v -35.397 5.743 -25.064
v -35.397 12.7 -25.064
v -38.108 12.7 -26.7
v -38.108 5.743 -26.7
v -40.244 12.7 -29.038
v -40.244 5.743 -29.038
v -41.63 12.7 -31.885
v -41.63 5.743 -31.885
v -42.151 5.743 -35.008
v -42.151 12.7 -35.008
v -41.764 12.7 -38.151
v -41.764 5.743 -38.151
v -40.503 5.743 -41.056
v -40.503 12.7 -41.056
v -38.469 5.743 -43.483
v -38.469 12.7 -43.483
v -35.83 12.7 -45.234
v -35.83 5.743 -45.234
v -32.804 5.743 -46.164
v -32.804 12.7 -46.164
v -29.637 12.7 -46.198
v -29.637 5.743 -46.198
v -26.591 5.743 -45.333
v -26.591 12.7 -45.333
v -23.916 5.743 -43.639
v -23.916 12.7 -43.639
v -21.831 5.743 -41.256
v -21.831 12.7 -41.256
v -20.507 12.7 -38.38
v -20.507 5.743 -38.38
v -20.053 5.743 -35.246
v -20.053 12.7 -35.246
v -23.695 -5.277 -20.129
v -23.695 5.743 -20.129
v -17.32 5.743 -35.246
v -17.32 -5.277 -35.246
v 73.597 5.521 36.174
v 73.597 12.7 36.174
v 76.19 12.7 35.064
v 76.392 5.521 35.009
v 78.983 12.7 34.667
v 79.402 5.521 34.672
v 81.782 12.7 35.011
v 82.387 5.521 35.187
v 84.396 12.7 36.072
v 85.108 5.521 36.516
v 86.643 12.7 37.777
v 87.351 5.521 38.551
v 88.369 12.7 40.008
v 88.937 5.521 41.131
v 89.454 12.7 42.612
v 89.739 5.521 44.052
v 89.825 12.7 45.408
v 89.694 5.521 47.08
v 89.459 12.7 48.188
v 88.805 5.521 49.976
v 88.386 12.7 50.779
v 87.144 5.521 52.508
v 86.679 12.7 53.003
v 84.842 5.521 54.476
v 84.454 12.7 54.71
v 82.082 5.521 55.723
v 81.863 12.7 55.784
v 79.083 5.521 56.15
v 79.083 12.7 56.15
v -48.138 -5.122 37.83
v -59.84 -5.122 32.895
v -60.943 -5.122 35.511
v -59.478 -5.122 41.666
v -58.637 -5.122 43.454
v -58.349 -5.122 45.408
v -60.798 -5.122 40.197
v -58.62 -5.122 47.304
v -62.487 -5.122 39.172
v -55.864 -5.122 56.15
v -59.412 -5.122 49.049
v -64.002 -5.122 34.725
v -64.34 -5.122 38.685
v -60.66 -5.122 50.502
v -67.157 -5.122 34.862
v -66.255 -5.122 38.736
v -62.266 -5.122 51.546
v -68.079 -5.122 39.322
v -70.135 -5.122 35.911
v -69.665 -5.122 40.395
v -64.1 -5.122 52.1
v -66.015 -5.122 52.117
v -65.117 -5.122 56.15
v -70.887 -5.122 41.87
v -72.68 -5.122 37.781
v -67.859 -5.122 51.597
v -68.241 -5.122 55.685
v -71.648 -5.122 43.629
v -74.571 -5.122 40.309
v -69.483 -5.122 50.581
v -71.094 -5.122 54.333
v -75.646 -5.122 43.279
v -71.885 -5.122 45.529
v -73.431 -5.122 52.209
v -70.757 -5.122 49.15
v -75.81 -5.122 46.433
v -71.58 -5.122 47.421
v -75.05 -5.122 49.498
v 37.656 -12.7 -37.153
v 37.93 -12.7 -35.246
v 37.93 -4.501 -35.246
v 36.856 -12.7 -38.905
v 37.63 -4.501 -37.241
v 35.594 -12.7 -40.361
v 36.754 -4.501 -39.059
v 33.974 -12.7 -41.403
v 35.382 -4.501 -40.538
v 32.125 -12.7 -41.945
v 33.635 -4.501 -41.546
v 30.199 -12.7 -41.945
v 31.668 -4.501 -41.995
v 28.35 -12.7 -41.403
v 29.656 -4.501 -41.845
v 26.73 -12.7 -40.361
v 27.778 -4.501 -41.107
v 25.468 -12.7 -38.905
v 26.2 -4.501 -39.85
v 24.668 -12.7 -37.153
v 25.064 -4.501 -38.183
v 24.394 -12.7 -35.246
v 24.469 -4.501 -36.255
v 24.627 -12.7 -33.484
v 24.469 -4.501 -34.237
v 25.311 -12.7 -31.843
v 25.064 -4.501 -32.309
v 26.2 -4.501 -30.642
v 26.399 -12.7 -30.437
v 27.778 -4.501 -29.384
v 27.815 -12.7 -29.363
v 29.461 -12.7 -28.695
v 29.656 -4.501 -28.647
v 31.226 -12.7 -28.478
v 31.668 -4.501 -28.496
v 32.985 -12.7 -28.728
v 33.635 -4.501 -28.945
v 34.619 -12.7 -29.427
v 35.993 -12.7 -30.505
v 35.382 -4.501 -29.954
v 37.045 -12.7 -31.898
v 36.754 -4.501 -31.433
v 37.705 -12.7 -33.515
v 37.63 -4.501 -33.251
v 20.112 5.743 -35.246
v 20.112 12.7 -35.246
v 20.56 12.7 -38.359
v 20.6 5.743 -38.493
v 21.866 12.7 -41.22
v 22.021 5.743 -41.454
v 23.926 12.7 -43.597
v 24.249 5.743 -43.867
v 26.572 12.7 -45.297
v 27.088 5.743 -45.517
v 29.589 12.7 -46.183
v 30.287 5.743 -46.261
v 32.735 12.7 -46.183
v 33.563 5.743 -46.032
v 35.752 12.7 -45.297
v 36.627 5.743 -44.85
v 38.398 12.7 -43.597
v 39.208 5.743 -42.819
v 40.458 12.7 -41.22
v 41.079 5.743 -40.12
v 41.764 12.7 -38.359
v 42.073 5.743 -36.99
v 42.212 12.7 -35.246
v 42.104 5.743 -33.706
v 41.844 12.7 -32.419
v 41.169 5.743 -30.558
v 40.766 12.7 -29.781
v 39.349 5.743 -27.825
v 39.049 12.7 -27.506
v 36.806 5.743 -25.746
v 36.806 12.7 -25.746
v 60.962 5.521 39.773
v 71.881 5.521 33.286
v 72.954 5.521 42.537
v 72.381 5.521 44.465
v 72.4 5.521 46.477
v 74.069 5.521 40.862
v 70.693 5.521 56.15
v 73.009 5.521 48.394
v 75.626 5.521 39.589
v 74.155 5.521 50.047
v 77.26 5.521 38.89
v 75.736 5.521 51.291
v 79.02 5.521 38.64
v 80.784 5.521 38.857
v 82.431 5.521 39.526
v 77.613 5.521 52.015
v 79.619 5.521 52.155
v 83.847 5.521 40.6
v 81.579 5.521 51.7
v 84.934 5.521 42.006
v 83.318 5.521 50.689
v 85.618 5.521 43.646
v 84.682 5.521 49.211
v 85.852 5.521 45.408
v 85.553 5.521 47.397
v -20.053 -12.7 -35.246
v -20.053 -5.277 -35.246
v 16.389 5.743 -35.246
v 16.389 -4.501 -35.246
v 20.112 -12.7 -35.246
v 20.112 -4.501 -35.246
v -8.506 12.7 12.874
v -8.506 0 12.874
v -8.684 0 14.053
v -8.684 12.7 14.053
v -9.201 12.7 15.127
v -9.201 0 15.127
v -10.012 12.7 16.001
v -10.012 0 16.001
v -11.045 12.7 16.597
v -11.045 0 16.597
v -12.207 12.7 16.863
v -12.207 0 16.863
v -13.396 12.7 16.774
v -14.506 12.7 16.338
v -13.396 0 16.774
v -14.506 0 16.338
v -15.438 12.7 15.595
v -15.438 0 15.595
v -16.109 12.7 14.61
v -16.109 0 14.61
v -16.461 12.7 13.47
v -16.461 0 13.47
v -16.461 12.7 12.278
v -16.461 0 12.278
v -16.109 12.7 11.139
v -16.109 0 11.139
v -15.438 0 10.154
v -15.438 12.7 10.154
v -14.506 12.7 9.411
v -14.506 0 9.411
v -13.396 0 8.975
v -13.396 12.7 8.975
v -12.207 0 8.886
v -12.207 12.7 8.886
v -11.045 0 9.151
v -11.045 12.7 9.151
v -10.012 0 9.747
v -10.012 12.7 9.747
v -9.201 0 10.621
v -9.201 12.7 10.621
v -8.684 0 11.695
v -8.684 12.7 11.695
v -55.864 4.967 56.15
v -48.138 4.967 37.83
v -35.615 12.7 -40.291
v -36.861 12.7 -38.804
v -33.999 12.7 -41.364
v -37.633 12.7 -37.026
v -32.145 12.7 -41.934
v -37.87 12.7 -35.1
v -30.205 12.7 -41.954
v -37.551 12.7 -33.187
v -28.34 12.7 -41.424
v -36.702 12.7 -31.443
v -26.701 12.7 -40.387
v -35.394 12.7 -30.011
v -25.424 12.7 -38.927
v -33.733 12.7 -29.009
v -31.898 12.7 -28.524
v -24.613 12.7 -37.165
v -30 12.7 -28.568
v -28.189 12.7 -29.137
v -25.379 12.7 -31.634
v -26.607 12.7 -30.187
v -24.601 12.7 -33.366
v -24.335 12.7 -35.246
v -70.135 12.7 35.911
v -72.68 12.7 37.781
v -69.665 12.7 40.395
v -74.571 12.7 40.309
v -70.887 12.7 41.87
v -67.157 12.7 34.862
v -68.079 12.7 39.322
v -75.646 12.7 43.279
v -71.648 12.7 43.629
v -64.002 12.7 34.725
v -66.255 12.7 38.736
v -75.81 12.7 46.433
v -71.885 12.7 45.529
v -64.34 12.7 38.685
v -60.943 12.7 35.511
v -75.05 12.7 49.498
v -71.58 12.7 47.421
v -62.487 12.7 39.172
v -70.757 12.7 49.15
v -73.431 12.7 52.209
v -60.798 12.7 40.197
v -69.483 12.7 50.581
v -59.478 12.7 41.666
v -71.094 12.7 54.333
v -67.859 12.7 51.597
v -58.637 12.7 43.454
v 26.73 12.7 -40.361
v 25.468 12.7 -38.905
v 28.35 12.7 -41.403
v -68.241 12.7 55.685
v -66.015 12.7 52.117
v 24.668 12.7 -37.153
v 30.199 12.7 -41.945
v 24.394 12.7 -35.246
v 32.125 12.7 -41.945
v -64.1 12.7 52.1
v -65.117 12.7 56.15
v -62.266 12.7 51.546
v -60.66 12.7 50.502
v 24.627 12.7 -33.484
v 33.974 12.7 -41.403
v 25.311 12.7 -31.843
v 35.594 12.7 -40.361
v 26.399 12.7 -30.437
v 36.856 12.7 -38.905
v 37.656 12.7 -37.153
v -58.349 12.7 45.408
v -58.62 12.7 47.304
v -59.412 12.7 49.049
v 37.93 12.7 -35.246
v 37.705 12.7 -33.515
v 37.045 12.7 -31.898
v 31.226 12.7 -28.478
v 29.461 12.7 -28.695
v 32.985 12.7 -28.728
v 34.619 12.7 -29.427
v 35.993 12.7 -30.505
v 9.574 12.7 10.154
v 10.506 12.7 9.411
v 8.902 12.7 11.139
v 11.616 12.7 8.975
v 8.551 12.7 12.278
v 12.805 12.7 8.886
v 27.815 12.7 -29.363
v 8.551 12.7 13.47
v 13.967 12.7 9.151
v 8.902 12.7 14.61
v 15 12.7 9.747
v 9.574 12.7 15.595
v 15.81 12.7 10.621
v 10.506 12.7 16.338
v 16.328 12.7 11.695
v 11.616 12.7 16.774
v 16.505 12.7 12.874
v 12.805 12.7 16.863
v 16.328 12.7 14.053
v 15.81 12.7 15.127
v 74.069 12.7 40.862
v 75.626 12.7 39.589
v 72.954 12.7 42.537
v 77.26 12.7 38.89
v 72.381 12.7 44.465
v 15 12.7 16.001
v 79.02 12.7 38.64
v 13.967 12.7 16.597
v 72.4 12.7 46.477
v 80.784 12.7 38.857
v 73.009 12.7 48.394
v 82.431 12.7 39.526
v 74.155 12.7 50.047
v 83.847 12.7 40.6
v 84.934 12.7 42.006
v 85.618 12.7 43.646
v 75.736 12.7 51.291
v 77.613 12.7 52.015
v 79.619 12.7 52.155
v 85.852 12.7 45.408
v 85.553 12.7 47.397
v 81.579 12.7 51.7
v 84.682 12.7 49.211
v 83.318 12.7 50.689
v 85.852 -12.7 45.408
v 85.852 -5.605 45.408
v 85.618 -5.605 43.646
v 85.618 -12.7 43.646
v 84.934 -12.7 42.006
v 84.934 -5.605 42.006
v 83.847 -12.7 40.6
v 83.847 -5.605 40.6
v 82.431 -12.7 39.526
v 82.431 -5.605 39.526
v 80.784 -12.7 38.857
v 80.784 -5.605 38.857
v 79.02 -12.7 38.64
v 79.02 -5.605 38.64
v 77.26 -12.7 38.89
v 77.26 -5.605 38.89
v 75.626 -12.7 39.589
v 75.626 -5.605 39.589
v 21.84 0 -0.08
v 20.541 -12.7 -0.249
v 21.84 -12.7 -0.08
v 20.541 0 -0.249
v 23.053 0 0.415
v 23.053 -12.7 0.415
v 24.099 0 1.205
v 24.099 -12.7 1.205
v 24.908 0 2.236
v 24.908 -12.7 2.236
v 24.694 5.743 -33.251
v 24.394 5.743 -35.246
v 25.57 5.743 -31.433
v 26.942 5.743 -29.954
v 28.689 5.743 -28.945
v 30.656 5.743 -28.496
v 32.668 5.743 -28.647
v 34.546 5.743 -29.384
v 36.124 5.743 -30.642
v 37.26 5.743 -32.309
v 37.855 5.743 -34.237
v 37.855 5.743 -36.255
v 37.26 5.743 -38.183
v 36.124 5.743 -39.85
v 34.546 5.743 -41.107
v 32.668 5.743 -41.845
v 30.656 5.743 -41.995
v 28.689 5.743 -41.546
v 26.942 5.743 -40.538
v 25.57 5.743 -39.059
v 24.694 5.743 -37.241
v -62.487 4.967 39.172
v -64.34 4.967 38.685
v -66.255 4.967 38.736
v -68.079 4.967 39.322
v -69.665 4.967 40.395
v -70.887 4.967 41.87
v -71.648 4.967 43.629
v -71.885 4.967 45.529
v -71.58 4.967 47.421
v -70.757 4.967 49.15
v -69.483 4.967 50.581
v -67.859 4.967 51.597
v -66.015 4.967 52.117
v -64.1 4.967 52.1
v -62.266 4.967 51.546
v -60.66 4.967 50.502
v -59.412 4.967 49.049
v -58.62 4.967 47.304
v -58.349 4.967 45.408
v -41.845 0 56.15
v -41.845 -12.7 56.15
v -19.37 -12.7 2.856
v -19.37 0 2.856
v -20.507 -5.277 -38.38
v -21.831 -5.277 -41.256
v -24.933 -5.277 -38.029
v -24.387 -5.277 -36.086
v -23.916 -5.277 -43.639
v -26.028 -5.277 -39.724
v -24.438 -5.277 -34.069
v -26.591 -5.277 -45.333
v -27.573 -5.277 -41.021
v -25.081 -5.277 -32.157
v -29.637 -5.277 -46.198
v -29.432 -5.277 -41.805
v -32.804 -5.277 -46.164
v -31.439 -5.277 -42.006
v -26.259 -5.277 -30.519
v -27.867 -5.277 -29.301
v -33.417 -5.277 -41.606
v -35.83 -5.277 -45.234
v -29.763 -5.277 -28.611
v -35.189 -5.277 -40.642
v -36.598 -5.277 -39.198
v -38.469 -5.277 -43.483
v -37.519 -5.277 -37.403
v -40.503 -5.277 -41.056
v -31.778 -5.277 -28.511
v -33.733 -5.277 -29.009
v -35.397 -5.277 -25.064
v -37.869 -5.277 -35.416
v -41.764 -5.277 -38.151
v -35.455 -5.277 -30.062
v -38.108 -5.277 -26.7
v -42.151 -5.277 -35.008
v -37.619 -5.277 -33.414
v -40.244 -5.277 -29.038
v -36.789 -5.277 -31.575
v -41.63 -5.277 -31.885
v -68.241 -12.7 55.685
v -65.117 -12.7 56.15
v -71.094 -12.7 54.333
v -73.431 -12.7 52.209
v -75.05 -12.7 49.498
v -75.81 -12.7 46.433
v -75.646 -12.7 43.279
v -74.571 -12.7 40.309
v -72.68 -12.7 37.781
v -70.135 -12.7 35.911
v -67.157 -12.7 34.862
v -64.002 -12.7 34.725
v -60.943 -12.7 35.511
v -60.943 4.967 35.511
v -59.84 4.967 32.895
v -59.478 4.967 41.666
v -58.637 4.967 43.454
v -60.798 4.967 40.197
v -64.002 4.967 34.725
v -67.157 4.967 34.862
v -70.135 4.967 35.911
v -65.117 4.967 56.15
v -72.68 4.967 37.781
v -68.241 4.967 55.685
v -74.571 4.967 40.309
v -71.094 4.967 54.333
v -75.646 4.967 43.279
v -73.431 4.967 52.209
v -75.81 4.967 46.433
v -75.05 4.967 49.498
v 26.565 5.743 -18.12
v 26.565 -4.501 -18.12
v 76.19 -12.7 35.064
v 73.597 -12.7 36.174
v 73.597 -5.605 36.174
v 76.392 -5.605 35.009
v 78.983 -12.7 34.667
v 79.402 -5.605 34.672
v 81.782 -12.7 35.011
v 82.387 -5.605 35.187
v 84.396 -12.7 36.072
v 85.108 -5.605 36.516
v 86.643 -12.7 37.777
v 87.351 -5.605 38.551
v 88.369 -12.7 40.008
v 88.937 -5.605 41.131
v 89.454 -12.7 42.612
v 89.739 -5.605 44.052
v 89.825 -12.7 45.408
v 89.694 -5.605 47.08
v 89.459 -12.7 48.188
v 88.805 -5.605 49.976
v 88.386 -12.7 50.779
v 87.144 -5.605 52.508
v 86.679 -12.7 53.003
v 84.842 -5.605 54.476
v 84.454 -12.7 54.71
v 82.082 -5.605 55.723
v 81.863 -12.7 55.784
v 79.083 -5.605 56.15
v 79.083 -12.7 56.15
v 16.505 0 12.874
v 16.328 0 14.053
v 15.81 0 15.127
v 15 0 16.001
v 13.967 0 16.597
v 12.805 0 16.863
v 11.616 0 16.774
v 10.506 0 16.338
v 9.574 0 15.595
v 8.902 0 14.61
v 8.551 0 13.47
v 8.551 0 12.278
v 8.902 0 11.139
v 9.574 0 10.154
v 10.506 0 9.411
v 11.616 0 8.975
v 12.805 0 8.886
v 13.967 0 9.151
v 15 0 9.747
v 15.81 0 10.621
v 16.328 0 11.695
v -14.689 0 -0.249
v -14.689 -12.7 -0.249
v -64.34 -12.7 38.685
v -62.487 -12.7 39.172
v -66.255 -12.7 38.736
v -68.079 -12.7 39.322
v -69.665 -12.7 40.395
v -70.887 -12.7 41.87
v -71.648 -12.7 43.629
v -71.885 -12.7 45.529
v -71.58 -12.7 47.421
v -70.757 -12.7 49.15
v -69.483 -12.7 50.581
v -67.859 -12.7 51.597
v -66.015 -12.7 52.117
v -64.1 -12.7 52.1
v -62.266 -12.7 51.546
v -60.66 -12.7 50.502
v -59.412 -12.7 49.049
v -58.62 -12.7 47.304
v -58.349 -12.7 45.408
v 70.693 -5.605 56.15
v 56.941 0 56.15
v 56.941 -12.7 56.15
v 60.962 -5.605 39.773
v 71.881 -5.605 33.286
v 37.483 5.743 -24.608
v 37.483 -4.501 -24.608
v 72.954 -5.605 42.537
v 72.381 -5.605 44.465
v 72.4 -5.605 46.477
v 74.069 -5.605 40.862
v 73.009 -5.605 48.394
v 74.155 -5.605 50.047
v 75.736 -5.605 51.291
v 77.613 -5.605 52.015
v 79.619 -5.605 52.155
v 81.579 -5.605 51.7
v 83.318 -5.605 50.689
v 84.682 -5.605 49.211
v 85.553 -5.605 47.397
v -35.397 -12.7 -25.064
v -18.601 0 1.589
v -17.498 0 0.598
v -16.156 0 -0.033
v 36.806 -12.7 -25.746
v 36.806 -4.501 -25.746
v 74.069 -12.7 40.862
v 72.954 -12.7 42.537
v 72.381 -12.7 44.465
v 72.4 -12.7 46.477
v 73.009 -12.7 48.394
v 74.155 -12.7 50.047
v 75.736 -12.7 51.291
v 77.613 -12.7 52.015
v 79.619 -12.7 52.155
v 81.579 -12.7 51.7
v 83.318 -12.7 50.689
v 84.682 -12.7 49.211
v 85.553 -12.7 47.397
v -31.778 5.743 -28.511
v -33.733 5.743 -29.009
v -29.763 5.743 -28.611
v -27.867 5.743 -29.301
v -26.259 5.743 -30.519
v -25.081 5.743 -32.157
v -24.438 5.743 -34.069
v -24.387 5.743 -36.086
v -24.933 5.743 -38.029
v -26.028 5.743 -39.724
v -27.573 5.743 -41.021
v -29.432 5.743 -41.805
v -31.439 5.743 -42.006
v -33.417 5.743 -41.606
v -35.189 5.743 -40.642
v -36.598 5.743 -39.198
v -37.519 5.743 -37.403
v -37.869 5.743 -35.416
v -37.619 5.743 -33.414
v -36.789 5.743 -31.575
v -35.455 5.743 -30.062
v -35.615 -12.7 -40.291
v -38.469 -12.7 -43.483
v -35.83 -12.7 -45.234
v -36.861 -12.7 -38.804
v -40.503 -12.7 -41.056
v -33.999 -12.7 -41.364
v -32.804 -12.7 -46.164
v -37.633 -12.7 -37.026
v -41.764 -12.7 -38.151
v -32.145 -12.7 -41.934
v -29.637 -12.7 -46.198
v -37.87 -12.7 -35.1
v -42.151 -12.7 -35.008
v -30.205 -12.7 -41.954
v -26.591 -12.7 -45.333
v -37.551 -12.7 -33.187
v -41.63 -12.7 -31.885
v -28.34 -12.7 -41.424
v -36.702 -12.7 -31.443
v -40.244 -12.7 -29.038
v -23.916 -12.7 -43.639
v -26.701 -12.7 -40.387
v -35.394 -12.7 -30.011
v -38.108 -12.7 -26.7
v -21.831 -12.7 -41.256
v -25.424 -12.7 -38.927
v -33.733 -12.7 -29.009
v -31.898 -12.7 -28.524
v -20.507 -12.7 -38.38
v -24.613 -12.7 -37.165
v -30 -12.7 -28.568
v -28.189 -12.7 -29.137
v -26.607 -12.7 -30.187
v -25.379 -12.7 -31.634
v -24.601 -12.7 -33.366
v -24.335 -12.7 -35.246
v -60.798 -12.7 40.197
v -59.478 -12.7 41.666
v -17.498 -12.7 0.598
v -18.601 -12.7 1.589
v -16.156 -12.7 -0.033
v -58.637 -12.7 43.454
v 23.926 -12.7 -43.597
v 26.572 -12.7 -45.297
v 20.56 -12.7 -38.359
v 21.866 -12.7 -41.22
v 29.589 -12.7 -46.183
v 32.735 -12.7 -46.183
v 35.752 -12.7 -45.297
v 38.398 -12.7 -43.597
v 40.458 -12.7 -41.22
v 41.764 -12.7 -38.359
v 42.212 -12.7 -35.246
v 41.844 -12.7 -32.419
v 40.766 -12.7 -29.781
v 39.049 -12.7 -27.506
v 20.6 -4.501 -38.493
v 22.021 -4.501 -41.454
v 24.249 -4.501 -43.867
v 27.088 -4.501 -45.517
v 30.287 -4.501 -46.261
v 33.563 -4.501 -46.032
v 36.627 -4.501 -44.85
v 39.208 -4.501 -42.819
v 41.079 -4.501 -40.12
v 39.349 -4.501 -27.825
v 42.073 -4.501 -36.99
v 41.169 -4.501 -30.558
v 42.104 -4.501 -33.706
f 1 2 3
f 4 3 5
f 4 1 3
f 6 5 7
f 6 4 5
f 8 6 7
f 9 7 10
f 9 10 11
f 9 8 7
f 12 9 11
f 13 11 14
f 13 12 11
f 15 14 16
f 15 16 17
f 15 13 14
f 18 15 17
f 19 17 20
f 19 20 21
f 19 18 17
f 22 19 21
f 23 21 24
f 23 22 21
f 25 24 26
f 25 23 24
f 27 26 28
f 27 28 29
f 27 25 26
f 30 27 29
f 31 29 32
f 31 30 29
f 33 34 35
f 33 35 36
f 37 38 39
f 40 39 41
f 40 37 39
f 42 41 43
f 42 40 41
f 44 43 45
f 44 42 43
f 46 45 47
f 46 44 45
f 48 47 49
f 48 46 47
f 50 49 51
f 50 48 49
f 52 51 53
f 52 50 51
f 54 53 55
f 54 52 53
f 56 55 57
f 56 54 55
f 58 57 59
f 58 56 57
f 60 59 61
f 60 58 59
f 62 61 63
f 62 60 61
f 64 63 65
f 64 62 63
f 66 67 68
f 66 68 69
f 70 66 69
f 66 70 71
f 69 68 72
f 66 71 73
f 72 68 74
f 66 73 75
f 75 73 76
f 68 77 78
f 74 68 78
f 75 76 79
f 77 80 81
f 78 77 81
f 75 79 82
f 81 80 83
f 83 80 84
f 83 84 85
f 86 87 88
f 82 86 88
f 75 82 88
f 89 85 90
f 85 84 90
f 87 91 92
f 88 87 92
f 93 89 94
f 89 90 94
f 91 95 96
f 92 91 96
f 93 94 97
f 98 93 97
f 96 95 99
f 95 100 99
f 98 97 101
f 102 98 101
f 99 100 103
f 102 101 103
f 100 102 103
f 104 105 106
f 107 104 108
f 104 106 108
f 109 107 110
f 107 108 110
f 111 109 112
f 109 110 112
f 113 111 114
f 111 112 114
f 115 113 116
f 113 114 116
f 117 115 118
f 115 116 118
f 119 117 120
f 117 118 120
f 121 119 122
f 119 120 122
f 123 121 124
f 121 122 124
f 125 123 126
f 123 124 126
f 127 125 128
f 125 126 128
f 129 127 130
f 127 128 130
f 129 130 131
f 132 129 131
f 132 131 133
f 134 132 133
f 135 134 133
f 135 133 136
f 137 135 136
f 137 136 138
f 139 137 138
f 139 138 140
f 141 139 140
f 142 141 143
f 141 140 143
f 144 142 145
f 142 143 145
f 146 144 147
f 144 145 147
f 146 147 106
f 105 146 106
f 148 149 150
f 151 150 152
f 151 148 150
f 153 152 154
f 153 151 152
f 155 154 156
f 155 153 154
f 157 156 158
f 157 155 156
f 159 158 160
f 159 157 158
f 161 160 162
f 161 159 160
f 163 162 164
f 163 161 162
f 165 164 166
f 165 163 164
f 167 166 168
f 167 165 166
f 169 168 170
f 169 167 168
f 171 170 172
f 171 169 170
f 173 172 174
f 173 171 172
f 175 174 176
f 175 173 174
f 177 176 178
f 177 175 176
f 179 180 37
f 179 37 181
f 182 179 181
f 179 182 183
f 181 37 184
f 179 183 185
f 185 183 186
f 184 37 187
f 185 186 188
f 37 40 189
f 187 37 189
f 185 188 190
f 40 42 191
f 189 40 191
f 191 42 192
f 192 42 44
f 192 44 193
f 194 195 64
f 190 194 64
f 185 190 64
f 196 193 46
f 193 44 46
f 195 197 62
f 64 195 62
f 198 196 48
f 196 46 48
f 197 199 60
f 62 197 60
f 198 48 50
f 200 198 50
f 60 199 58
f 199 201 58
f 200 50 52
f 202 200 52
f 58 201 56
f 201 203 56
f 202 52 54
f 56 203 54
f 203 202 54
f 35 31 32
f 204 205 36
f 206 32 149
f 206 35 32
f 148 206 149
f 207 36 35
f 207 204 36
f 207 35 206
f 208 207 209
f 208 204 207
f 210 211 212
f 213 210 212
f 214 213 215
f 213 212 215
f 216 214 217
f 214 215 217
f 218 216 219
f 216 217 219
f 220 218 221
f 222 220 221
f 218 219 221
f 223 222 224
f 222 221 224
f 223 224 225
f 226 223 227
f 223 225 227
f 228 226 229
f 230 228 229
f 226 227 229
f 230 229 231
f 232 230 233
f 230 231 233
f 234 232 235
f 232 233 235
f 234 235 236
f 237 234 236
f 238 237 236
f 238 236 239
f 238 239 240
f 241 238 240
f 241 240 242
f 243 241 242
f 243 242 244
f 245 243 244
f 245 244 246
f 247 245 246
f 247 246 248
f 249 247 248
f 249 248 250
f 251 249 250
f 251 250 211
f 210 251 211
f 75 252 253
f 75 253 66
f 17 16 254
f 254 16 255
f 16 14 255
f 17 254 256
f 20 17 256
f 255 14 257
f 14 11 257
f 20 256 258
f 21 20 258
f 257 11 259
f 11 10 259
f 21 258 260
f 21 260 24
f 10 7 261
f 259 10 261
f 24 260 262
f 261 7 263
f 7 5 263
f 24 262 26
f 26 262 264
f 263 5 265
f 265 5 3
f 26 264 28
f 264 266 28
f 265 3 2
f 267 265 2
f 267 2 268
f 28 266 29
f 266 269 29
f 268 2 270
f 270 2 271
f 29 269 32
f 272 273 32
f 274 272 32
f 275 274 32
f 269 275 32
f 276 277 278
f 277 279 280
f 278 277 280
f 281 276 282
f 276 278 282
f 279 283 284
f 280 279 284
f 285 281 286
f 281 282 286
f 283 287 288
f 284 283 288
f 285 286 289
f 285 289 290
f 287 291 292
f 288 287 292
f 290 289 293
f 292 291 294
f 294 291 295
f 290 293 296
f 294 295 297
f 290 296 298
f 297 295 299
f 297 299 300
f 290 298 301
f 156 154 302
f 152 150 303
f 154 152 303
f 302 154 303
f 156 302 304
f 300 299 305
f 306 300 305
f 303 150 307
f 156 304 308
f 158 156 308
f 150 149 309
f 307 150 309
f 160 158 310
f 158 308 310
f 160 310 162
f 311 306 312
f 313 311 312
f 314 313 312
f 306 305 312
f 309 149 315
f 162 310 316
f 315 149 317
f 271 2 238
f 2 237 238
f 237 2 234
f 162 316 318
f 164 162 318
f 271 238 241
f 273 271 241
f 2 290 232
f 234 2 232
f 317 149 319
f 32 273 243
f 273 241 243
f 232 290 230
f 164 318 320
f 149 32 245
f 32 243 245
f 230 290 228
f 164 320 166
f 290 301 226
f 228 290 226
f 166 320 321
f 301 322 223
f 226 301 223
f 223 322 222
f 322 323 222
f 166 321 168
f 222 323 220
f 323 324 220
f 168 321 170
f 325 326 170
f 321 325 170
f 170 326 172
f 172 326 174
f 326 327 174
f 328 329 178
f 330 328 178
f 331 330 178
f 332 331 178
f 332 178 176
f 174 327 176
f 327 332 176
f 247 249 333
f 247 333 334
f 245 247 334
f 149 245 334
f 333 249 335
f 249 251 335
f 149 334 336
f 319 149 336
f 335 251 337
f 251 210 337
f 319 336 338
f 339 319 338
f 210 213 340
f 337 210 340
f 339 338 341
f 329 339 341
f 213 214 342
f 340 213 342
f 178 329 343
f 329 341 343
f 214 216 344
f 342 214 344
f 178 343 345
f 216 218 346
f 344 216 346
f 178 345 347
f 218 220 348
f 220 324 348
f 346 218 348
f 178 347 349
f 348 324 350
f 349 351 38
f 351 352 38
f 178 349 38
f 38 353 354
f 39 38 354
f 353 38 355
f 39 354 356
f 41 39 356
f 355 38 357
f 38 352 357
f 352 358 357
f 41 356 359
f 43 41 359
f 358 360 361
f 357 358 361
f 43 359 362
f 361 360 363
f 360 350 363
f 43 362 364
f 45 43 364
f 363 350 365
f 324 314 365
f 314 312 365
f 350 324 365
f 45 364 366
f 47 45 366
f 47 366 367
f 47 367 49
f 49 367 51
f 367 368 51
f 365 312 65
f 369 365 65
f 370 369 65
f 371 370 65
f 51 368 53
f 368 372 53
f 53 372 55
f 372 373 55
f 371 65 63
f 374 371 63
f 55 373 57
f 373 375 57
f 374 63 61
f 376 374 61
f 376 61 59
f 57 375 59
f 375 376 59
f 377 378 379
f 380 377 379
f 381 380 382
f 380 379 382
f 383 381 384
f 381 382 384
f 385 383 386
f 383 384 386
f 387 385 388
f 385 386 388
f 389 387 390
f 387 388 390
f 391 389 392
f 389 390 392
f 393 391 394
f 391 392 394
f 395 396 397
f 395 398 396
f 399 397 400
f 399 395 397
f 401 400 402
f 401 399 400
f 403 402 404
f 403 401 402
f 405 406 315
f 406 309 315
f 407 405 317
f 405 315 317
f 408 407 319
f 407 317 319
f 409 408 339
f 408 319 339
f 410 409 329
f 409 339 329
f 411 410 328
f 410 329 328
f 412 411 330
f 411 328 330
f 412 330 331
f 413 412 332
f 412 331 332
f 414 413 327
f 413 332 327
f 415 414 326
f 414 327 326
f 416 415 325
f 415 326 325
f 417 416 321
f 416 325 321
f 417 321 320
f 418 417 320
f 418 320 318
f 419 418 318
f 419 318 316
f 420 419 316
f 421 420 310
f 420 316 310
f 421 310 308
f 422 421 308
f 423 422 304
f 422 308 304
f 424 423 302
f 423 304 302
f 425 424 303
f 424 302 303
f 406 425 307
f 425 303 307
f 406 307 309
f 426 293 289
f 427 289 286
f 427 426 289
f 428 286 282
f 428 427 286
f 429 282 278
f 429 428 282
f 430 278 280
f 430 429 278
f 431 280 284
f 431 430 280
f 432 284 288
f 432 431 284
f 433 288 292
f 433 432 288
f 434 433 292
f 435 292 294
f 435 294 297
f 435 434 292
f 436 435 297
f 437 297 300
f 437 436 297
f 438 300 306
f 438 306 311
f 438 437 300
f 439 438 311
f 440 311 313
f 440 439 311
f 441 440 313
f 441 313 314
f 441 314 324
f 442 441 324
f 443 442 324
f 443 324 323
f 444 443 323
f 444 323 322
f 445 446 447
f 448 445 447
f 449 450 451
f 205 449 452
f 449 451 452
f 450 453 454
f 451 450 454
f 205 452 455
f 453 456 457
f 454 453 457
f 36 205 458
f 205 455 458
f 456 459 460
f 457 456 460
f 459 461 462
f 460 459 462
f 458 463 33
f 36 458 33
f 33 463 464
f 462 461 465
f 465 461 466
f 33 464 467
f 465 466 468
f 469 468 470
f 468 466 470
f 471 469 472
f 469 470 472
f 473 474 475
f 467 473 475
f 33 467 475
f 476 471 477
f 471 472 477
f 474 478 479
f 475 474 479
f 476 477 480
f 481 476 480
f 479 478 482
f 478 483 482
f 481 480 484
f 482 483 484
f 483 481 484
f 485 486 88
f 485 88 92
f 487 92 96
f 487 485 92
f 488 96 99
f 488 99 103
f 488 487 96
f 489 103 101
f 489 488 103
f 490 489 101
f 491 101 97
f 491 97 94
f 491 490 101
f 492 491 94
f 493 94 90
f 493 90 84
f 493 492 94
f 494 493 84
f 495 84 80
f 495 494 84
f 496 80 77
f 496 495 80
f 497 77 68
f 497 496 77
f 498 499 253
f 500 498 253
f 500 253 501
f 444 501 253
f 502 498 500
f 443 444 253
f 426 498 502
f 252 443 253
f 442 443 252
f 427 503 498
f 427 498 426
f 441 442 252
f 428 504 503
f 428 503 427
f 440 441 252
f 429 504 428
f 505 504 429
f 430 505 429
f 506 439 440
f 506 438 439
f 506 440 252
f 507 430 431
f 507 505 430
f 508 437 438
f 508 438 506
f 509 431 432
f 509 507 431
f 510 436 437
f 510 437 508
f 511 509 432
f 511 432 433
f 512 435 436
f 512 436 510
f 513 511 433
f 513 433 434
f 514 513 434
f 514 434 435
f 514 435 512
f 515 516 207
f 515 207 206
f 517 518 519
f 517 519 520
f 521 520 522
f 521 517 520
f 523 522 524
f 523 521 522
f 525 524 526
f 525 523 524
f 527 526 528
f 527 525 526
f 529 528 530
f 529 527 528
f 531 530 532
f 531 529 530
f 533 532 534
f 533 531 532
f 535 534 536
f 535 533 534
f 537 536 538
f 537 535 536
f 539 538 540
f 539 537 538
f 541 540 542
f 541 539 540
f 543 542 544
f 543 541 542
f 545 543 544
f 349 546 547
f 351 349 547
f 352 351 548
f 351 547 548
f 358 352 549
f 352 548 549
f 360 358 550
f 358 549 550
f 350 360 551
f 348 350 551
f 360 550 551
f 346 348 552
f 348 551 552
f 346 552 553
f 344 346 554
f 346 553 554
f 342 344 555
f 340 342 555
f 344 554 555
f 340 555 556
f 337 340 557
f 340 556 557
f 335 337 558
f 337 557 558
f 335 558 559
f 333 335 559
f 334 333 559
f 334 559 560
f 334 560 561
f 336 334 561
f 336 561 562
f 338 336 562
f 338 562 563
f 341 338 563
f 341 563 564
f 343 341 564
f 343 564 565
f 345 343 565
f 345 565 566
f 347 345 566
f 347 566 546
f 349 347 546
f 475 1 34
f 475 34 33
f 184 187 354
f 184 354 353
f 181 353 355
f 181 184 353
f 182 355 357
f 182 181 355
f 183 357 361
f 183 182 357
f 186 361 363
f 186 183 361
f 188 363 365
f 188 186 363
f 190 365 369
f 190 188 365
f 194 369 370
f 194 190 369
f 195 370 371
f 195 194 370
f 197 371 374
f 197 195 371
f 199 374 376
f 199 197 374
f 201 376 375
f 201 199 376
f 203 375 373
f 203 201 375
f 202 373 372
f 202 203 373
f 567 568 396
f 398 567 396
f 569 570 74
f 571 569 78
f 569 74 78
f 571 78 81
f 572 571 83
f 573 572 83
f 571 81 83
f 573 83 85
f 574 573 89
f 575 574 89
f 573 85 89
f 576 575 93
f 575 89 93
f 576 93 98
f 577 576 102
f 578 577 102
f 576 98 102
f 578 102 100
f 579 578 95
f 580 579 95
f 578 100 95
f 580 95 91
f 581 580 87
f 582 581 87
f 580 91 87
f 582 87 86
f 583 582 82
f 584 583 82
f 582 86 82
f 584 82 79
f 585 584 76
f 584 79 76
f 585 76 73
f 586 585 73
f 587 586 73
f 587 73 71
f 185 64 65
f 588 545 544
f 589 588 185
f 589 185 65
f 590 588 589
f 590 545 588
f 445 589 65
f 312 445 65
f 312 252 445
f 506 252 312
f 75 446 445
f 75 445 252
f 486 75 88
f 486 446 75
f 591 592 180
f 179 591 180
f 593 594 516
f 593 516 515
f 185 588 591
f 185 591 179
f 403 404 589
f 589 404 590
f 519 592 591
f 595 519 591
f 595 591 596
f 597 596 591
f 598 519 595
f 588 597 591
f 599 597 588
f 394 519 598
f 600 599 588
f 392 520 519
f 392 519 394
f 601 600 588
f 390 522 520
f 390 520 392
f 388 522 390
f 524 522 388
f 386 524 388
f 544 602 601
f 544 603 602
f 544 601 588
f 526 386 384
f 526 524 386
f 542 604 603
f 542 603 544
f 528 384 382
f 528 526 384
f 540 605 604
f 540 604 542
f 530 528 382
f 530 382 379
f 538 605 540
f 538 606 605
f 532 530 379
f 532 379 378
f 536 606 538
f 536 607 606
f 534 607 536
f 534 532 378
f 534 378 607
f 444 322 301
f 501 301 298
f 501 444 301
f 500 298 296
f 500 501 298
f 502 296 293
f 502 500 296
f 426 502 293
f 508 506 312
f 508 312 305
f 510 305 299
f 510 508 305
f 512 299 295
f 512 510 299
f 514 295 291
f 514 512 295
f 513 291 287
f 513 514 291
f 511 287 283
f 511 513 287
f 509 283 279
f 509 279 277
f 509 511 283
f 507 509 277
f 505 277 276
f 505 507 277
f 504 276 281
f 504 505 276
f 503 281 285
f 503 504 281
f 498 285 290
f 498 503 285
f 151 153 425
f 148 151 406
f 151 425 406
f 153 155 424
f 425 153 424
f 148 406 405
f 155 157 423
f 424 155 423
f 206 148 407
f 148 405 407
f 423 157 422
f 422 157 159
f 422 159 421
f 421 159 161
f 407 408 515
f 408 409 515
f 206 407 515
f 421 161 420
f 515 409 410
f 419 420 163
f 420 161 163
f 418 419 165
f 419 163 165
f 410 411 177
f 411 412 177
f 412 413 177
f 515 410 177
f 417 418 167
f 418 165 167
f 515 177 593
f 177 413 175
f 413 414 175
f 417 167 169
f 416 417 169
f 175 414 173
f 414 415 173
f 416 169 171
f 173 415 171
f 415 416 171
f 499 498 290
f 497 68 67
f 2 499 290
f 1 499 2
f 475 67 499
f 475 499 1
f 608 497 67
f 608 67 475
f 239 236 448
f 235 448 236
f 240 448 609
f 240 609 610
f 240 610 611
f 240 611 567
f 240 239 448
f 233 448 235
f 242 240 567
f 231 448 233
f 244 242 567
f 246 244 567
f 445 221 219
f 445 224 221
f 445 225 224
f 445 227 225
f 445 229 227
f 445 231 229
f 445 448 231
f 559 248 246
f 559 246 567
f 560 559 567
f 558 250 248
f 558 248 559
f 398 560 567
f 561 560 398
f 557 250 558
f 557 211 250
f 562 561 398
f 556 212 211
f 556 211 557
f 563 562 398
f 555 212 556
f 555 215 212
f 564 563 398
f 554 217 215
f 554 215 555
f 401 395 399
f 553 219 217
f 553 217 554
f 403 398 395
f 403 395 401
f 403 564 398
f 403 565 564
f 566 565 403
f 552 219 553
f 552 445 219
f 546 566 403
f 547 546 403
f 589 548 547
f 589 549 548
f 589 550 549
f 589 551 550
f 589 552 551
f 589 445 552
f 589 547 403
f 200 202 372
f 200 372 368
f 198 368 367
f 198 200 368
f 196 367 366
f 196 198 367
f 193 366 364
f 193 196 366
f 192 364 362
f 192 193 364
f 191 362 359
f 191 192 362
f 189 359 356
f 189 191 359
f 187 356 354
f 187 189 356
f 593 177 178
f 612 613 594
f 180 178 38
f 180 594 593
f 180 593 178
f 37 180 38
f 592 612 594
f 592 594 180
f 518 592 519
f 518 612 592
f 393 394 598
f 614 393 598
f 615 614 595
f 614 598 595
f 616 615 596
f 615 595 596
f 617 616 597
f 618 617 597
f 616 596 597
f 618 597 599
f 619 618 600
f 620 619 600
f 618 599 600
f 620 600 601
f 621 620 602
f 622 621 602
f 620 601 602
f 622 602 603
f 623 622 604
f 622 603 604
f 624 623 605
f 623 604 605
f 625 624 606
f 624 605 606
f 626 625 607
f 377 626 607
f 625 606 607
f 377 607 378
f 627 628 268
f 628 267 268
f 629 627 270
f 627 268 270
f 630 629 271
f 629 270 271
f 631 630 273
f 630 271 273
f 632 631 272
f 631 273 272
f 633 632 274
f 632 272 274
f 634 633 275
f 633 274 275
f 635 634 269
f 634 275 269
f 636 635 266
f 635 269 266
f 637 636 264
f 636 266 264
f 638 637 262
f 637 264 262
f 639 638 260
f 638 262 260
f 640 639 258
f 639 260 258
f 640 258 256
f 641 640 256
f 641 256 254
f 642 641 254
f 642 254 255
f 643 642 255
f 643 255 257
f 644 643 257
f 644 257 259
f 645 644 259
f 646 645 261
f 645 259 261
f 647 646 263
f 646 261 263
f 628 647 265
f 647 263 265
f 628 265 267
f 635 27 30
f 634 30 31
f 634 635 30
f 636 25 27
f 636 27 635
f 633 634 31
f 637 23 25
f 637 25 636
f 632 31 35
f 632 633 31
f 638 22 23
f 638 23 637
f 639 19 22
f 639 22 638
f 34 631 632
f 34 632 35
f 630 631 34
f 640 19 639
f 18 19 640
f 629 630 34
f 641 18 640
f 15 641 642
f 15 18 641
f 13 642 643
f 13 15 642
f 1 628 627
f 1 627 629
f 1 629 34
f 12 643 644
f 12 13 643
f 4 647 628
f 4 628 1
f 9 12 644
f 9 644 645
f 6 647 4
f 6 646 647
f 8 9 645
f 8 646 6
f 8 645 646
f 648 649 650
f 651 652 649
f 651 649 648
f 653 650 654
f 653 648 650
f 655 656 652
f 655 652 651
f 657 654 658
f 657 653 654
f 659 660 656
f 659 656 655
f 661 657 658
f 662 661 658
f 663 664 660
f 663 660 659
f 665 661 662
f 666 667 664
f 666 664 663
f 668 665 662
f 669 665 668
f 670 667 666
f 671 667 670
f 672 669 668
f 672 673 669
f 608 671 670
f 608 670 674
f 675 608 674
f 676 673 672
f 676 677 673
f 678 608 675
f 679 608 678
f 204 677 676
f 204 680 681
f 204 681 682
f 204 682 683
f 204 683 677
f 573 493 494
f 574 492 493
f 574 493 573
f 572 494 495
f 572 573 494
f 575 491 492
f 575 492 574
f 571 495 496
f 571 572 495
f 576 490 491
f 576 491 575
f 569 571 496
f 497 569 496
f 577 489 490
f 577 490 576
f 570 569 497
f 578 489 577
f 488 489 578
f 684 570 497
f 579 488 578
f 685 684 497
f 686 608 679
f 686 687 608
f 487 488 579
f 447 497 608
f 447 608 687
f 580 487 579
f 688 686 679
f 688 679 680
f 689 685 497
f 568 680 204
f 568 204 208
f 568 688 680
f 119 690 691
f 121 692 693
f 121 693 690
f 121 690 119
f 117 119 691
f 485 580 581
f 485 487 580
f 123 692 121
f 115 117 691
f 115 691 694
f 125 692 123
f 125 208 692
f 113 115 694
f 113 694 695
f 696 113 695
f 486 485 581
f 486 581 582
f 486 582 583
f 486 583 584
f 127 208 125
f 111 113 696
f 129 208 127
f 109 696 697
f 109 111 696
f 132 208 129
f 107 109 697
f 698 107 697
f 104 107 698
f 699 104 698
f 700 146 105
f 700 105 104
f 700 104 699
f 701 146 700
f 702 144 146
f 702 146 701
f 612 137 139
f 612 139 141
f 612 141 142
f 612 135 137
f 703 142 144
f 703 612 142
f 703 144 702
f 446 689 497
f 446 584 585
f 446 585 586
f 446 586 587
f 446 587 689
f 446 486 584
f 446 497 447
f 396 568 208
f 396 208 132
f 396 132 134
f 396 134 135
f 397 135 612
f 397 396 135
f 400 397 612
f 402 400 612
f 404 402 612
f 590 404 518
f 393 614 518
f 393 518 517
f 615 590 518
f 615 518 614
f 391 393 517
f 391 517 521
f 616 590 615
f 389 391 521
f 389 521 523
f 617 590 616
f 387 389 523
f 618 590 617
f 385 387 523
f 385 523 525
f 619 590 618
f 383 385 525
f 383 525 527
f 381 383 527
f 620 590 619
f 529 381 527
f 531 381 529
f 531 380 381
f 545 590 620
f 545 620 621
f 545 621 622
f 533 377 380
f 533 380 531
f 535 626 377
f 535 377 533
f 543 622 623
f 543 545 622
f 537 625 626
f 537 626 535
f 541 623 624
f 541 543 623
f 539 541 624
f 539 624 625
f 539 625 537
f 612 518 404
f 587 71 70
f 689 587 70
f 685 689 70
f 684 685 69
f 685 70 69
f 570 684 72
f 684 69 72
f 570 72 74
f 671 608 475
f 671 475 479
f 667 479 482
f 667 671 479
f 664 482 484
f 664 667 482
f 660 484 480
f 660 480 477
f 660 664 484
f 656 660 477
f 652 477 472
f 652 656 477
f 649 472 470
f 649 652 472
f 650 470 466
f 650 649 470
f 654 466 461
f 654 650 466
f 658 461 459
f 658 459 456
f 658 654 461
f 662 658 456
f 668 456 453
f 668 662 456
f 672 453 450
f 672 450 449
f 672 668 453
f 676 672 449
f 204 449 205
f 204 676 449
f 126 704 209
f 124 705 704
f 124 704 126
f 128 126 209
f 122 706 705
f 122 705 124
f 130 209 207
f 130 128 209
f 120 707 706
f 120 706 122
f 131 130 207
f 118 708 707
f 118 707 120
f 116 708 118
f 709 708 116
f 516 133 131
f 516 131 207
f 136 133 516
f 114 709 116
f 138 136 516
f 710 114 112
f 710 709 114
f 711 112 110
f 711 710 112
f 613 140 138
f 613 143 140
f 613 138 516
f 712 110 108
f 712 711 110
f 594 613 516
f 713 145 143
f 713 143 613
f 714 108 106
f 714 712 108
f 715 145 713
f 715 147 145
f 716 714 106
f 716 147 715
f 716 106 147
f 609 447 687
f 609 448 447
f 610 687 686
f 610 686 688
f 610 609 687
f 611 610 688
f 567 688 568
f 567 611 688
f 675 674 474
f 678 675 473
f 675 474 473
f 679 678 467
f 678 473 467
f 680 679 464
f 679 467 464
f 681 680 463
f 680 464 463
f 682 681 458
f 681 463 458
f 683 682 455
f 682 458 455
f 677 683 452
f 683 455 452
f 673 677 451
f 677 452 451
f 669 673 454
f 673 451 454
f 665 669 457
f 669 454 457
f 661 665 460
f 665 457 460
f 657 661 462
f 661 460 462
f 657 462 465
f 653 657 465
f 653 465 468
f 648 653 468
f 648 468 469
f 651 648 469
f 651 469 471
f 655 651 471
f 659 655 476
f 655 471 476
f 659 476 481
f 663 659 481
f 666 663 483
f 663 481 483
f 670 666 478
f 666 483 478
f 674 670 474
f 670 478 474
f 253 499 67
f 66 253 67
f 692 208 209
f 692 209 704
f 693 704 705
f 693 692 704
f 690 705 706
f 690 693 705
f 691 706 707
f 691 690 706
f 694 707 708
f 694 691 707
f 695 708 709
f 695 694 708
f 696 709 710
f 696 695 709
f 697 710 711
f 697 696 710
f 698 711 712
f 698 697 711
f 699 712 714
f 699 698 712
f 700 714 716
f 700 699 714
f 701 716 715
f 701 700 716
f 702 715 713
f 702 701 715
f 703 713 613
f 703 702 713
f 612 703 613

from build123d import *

# Parameters (mm, degrees)
F1_DEPTH  = 12.7
F3_DEPTH  = 12.7
F4_R      = 5.08
F5_R      = 3.9996078941
F6_DEPTH  = 25.4
F9_W      = 11.1263459548
F9_H      = 26.6221612692
F10_DEPTH = 12.7
F11_W     = 10.2434670553
F11_H     = 31.0408079531
F12_DEPTH = 12.7
F13_W     = 10.0882626139
F13_H     = 25.7638730109
F14_DEPTH = 12.7
F15_W     = 11.0194860026
F15_H     = 24.3218261437
F16_DEPTH = 12.7


with BuildPart() as f1:
    # F0 (on Front) → F1 (new body, symmetric)
    with BuildSketch(Plane.XZ):
        with BuildLine():
            ThreePointArc((-60.9433906042, 35.5109754222), (-56.1671910173, 39.4692096565), (-54.3759944375, 45.4081755227))
            ThreePointArc((-54.3759944375, 45.4081755227), (-57.5220599051, 53.0034494428), (-65.1173338252, 56.1495149105))
            ThreePointArc((-65.1173338252, 56.1495149105), (-75.6455235346, 43.2789518879), (-60.9433906042, 35.5109754222))
        make_face()
        with BuildLine():
            ThreePointArc((-58.3489453471, 45.4081755227), (-59.4776234248, 41.6658835524), (-62.4872270773, 39.1717004698))
            ThreePointArc((-62.4872270773, 39.1717004698), (-70.7570442257, 49.150467493), (-58.3489453471, 45.4081755227))
        make_face(mode=Mode.SUBTRACT)
        with BuildLine():
            ThreePointArc((-65.1173338252, 56.1495149105), (-57.5220599051, 53.0034494428), (-54.3759944375, 45.4081755227))
            ThreePointArc((-54.3759944375, 45.4081755227), (-56.1671910173, 39.4692096565), (-60.9433906042, 35.5109754222))
            Line((-60.9433906042, 35.5109754222), (-35.3970214505, -25.0642442118))
            ThreePointArc((-35.3970214505, -25.0642442118), (-24.9935148248, -26.0385154856), (-20.0531436301, -35.2458433869))
            Line((-20.0531436301, -35.2458433869), (20.1120705093, -35.2458433869))
            ThreePointArc((20.1120705093, -35.2458433869), (25.6970539708, -25.6418838342), (36.8063836854, -25.7461558165))
            Line((36.8063836854, -25.7461558165), (73.5966621145, 36.1738394268))
            ThreePointArc((73.5966621145, 36.1738394268), (68.7255805584, 48.2531038009), (79.0833194494, 56.1495149105))
            Line((79.0833194494, 56.1495149105), (-65.1173338252, 56.1495149105))
        make_face()
        with BuildLine():
            ThreePointArc((89.8246588372, 45.4081755227), (86.6785933696, 53.0034494428), (79.0833194494, 56.1495149105))
            ThreePointArc((79.0833194494, 56.1495149105), (68.7255805584, 48.2531038009), (73.5966621145, 36.1738394268))
            ThreePointArc((73.5966621145, 36.1738394268), (84.3956787796, 36.0724800376), (89.8246588372, 45.4081755227))
        make_face()
        with BuildLine():
            ThreePointArc((85.8517079276, 45.4081755227), (82.4307708597, 39.5255186699), (75.6260384765, 39.5893877739))
            ThreePointArc((75.6260384765, 39.5893877739), (75.7358680391, 51.2908323755), (85.8517079276, 45.4081755227))
        make_face(mode=Mode.SUBTRACT)
        with BuildLine():
            Line((-33.7332454412, -29.009368334), (-35.3970214505, -25.0642442118))
            ThreePointArc((-35.3970214505, -25.0642442118), (-37.2127625616, -44.4531712882), (-20.0531436301, -35.2458433869))
            Line((-20.0531436301, -35.2458433869), (-24.334750215, -35.2458433869))
            ThreePointArc((-24.334750215, -35.2458433869), (-34.8454306635, -40.8855537873), (-33.7332454412, -29.009368334))
        make_face()
        with BuildLine():
            ThreePointArc((-20.0531436301, -35.2458433869), (-24.9935148248, -26.0385154856), (-35.3970214505, -25.0642442118))
            Line((-35.3970214505, -25.0642442118), (-33.7332454412, -29.009368334))
            ThreePointArc((-33.7332454412, -29.009368334), (-27.3608467229, -29.6061329865), (-24.334750215, -35.2458433869))
            Line((-24.334750215, -35.2458433869), (-20.0531436301, -35.2458433869))
        make_face()
        with BuildLine():
            Line((34.6193465454, -29.4270556381), (36.8063836854, -25.7461558165))
            ThreePointArc((36.8063836854, -25.7461558165), (25.6970539708, -25.6418838342), (20.1120705093, -35.2458433869))
            Line((20.1120705093, -35.2458433869), (24.3936770943, -35.2458433869))
            ThreePointArc((24.3936770943, -35.2458433869), (27.8146141622, -29.3631865341), (34.6193465454, -29.4270556381))
        make_face()
        with BuildLine():
            ThreePointArc((42.2120606357, -35.2458433869), (40.7660251252, -29.7808317852), (36.8063836854, -25.7461558165))
            Line((36.8063836854, -25.7461558165), (34.6193465454, -29.4270556381))
            ThreePointArc((34.6193465454, -29.4270556381), (37.0447224253, -31.8983919766), (37.9304540507, -35.2458433869))
            ThreePointArc((37.9304540507, -35.2458433869), (31.1620655725, -42.0142318651), (24.3936770943, -35.2458433869))
            Line((24.3936770943, -35.2458433869), (20.1120705093, -35.2458433869))
            ThreePointArc((20.1120705093, -35.2458433869), (31.1620655725, -46.2958384501), (42.2120606357, -35.2458433869))
        make_face()
    extrude(amount=F1_DEPTH, both=True)

    # F2 (on face) → F3 (cut)
    with BuildSketch(Plane.XZ.offset(12.7)):
        Polygon((-41.8454812837, 56.1495149105), (-18.0603434561, -0.2494958163), (23.4314955848, -0.2494958163), (56.9414353, 56.1495149105), align=None)
    extrude(amount=-F3_DEPTH, mode=Mode.SUBTRACT)

    # F4
    f4_edges = [f1.edges().sort_by_distance(p)[0] for p in [
        (23.431496, -6.35, -0.249496),
        (-18.060343, -6.35, -0.249496),
    ]]
    fillet(f4_edges, radius=F4_R)

    # F5 (on face) → F6 (cut)
    with BuildSketch(Plane.XZ):
        with Locations((-12.5058135018, 12.8743648529)):
            Circle(F5_R)
        with Locations((12.5058135018, 12.8743648529)):
            Circle(F5_R)
    extrude(amount=-F6_DEPTH, mode=Mode.SUBTRACT)

    # F9 (on face) → F10 (cut, symmetric)
    with BuildSketch(Plane(origin=(38.5090528963, 0, -22.8804729802), x_dir=(0, 1, 0), z_dir=(0.8597006167, 0, -0.5107982475))):
        with Locations((-0.0419579446, 78.6430984735)):
            Rectangle(F9_W, F9_H)
    extrude(amount=F10_DEPTH, both=True, mode=Mode.SUBTRACT)

    # F11 (on face) → F12 (cut, symmetric)
    with BuildSketch(Plane(origin=(38.5090528963, 0, -22.8804729802), x_dir=(0, 1, 0), z_dir=(0.8597006167, 0, -0.5107982475))):
        with Locations((0.6208214909, -17.5293247448)):
            Rectangle(F11_W, F11_H)
    extrude(amount=F12_DEPTH, both=True, mode=Mode.SUBTRACT)

    # F13 (on face) → F14 (cut, symmetric)
    with BuildSketch(Plane(origin=(-39.0262986274, 0, -16.4585491801), x_dir=(0, -1, 0), z_dir=(-0.9214121017, 0, -0.3885868485))):
        with Locations((0.0776012894, 66.4450954646)):
            Rectangle(F13_W, F13_H)
    extrude(amount=F14_DEPTH, both=True, mode=Mode.SUBTRACT)

    # F15 (on face) → F16 (cut, symmetric)
    with BuildSketch(Plane(origin=(-39.0262986274, 0, -16.4585491801), x_dir=(0, -1, 0), z_dir=(-0.9214121017, 0, -0.3885868485))):
        with Locations((-0.2328096889, -21.5005939982)):
            Rectangle(F15_W, F15_H)
    extrude(amount=F16_DEPTH, both=True, mode=Mode.SUBTRACT)


solid = f1.part
